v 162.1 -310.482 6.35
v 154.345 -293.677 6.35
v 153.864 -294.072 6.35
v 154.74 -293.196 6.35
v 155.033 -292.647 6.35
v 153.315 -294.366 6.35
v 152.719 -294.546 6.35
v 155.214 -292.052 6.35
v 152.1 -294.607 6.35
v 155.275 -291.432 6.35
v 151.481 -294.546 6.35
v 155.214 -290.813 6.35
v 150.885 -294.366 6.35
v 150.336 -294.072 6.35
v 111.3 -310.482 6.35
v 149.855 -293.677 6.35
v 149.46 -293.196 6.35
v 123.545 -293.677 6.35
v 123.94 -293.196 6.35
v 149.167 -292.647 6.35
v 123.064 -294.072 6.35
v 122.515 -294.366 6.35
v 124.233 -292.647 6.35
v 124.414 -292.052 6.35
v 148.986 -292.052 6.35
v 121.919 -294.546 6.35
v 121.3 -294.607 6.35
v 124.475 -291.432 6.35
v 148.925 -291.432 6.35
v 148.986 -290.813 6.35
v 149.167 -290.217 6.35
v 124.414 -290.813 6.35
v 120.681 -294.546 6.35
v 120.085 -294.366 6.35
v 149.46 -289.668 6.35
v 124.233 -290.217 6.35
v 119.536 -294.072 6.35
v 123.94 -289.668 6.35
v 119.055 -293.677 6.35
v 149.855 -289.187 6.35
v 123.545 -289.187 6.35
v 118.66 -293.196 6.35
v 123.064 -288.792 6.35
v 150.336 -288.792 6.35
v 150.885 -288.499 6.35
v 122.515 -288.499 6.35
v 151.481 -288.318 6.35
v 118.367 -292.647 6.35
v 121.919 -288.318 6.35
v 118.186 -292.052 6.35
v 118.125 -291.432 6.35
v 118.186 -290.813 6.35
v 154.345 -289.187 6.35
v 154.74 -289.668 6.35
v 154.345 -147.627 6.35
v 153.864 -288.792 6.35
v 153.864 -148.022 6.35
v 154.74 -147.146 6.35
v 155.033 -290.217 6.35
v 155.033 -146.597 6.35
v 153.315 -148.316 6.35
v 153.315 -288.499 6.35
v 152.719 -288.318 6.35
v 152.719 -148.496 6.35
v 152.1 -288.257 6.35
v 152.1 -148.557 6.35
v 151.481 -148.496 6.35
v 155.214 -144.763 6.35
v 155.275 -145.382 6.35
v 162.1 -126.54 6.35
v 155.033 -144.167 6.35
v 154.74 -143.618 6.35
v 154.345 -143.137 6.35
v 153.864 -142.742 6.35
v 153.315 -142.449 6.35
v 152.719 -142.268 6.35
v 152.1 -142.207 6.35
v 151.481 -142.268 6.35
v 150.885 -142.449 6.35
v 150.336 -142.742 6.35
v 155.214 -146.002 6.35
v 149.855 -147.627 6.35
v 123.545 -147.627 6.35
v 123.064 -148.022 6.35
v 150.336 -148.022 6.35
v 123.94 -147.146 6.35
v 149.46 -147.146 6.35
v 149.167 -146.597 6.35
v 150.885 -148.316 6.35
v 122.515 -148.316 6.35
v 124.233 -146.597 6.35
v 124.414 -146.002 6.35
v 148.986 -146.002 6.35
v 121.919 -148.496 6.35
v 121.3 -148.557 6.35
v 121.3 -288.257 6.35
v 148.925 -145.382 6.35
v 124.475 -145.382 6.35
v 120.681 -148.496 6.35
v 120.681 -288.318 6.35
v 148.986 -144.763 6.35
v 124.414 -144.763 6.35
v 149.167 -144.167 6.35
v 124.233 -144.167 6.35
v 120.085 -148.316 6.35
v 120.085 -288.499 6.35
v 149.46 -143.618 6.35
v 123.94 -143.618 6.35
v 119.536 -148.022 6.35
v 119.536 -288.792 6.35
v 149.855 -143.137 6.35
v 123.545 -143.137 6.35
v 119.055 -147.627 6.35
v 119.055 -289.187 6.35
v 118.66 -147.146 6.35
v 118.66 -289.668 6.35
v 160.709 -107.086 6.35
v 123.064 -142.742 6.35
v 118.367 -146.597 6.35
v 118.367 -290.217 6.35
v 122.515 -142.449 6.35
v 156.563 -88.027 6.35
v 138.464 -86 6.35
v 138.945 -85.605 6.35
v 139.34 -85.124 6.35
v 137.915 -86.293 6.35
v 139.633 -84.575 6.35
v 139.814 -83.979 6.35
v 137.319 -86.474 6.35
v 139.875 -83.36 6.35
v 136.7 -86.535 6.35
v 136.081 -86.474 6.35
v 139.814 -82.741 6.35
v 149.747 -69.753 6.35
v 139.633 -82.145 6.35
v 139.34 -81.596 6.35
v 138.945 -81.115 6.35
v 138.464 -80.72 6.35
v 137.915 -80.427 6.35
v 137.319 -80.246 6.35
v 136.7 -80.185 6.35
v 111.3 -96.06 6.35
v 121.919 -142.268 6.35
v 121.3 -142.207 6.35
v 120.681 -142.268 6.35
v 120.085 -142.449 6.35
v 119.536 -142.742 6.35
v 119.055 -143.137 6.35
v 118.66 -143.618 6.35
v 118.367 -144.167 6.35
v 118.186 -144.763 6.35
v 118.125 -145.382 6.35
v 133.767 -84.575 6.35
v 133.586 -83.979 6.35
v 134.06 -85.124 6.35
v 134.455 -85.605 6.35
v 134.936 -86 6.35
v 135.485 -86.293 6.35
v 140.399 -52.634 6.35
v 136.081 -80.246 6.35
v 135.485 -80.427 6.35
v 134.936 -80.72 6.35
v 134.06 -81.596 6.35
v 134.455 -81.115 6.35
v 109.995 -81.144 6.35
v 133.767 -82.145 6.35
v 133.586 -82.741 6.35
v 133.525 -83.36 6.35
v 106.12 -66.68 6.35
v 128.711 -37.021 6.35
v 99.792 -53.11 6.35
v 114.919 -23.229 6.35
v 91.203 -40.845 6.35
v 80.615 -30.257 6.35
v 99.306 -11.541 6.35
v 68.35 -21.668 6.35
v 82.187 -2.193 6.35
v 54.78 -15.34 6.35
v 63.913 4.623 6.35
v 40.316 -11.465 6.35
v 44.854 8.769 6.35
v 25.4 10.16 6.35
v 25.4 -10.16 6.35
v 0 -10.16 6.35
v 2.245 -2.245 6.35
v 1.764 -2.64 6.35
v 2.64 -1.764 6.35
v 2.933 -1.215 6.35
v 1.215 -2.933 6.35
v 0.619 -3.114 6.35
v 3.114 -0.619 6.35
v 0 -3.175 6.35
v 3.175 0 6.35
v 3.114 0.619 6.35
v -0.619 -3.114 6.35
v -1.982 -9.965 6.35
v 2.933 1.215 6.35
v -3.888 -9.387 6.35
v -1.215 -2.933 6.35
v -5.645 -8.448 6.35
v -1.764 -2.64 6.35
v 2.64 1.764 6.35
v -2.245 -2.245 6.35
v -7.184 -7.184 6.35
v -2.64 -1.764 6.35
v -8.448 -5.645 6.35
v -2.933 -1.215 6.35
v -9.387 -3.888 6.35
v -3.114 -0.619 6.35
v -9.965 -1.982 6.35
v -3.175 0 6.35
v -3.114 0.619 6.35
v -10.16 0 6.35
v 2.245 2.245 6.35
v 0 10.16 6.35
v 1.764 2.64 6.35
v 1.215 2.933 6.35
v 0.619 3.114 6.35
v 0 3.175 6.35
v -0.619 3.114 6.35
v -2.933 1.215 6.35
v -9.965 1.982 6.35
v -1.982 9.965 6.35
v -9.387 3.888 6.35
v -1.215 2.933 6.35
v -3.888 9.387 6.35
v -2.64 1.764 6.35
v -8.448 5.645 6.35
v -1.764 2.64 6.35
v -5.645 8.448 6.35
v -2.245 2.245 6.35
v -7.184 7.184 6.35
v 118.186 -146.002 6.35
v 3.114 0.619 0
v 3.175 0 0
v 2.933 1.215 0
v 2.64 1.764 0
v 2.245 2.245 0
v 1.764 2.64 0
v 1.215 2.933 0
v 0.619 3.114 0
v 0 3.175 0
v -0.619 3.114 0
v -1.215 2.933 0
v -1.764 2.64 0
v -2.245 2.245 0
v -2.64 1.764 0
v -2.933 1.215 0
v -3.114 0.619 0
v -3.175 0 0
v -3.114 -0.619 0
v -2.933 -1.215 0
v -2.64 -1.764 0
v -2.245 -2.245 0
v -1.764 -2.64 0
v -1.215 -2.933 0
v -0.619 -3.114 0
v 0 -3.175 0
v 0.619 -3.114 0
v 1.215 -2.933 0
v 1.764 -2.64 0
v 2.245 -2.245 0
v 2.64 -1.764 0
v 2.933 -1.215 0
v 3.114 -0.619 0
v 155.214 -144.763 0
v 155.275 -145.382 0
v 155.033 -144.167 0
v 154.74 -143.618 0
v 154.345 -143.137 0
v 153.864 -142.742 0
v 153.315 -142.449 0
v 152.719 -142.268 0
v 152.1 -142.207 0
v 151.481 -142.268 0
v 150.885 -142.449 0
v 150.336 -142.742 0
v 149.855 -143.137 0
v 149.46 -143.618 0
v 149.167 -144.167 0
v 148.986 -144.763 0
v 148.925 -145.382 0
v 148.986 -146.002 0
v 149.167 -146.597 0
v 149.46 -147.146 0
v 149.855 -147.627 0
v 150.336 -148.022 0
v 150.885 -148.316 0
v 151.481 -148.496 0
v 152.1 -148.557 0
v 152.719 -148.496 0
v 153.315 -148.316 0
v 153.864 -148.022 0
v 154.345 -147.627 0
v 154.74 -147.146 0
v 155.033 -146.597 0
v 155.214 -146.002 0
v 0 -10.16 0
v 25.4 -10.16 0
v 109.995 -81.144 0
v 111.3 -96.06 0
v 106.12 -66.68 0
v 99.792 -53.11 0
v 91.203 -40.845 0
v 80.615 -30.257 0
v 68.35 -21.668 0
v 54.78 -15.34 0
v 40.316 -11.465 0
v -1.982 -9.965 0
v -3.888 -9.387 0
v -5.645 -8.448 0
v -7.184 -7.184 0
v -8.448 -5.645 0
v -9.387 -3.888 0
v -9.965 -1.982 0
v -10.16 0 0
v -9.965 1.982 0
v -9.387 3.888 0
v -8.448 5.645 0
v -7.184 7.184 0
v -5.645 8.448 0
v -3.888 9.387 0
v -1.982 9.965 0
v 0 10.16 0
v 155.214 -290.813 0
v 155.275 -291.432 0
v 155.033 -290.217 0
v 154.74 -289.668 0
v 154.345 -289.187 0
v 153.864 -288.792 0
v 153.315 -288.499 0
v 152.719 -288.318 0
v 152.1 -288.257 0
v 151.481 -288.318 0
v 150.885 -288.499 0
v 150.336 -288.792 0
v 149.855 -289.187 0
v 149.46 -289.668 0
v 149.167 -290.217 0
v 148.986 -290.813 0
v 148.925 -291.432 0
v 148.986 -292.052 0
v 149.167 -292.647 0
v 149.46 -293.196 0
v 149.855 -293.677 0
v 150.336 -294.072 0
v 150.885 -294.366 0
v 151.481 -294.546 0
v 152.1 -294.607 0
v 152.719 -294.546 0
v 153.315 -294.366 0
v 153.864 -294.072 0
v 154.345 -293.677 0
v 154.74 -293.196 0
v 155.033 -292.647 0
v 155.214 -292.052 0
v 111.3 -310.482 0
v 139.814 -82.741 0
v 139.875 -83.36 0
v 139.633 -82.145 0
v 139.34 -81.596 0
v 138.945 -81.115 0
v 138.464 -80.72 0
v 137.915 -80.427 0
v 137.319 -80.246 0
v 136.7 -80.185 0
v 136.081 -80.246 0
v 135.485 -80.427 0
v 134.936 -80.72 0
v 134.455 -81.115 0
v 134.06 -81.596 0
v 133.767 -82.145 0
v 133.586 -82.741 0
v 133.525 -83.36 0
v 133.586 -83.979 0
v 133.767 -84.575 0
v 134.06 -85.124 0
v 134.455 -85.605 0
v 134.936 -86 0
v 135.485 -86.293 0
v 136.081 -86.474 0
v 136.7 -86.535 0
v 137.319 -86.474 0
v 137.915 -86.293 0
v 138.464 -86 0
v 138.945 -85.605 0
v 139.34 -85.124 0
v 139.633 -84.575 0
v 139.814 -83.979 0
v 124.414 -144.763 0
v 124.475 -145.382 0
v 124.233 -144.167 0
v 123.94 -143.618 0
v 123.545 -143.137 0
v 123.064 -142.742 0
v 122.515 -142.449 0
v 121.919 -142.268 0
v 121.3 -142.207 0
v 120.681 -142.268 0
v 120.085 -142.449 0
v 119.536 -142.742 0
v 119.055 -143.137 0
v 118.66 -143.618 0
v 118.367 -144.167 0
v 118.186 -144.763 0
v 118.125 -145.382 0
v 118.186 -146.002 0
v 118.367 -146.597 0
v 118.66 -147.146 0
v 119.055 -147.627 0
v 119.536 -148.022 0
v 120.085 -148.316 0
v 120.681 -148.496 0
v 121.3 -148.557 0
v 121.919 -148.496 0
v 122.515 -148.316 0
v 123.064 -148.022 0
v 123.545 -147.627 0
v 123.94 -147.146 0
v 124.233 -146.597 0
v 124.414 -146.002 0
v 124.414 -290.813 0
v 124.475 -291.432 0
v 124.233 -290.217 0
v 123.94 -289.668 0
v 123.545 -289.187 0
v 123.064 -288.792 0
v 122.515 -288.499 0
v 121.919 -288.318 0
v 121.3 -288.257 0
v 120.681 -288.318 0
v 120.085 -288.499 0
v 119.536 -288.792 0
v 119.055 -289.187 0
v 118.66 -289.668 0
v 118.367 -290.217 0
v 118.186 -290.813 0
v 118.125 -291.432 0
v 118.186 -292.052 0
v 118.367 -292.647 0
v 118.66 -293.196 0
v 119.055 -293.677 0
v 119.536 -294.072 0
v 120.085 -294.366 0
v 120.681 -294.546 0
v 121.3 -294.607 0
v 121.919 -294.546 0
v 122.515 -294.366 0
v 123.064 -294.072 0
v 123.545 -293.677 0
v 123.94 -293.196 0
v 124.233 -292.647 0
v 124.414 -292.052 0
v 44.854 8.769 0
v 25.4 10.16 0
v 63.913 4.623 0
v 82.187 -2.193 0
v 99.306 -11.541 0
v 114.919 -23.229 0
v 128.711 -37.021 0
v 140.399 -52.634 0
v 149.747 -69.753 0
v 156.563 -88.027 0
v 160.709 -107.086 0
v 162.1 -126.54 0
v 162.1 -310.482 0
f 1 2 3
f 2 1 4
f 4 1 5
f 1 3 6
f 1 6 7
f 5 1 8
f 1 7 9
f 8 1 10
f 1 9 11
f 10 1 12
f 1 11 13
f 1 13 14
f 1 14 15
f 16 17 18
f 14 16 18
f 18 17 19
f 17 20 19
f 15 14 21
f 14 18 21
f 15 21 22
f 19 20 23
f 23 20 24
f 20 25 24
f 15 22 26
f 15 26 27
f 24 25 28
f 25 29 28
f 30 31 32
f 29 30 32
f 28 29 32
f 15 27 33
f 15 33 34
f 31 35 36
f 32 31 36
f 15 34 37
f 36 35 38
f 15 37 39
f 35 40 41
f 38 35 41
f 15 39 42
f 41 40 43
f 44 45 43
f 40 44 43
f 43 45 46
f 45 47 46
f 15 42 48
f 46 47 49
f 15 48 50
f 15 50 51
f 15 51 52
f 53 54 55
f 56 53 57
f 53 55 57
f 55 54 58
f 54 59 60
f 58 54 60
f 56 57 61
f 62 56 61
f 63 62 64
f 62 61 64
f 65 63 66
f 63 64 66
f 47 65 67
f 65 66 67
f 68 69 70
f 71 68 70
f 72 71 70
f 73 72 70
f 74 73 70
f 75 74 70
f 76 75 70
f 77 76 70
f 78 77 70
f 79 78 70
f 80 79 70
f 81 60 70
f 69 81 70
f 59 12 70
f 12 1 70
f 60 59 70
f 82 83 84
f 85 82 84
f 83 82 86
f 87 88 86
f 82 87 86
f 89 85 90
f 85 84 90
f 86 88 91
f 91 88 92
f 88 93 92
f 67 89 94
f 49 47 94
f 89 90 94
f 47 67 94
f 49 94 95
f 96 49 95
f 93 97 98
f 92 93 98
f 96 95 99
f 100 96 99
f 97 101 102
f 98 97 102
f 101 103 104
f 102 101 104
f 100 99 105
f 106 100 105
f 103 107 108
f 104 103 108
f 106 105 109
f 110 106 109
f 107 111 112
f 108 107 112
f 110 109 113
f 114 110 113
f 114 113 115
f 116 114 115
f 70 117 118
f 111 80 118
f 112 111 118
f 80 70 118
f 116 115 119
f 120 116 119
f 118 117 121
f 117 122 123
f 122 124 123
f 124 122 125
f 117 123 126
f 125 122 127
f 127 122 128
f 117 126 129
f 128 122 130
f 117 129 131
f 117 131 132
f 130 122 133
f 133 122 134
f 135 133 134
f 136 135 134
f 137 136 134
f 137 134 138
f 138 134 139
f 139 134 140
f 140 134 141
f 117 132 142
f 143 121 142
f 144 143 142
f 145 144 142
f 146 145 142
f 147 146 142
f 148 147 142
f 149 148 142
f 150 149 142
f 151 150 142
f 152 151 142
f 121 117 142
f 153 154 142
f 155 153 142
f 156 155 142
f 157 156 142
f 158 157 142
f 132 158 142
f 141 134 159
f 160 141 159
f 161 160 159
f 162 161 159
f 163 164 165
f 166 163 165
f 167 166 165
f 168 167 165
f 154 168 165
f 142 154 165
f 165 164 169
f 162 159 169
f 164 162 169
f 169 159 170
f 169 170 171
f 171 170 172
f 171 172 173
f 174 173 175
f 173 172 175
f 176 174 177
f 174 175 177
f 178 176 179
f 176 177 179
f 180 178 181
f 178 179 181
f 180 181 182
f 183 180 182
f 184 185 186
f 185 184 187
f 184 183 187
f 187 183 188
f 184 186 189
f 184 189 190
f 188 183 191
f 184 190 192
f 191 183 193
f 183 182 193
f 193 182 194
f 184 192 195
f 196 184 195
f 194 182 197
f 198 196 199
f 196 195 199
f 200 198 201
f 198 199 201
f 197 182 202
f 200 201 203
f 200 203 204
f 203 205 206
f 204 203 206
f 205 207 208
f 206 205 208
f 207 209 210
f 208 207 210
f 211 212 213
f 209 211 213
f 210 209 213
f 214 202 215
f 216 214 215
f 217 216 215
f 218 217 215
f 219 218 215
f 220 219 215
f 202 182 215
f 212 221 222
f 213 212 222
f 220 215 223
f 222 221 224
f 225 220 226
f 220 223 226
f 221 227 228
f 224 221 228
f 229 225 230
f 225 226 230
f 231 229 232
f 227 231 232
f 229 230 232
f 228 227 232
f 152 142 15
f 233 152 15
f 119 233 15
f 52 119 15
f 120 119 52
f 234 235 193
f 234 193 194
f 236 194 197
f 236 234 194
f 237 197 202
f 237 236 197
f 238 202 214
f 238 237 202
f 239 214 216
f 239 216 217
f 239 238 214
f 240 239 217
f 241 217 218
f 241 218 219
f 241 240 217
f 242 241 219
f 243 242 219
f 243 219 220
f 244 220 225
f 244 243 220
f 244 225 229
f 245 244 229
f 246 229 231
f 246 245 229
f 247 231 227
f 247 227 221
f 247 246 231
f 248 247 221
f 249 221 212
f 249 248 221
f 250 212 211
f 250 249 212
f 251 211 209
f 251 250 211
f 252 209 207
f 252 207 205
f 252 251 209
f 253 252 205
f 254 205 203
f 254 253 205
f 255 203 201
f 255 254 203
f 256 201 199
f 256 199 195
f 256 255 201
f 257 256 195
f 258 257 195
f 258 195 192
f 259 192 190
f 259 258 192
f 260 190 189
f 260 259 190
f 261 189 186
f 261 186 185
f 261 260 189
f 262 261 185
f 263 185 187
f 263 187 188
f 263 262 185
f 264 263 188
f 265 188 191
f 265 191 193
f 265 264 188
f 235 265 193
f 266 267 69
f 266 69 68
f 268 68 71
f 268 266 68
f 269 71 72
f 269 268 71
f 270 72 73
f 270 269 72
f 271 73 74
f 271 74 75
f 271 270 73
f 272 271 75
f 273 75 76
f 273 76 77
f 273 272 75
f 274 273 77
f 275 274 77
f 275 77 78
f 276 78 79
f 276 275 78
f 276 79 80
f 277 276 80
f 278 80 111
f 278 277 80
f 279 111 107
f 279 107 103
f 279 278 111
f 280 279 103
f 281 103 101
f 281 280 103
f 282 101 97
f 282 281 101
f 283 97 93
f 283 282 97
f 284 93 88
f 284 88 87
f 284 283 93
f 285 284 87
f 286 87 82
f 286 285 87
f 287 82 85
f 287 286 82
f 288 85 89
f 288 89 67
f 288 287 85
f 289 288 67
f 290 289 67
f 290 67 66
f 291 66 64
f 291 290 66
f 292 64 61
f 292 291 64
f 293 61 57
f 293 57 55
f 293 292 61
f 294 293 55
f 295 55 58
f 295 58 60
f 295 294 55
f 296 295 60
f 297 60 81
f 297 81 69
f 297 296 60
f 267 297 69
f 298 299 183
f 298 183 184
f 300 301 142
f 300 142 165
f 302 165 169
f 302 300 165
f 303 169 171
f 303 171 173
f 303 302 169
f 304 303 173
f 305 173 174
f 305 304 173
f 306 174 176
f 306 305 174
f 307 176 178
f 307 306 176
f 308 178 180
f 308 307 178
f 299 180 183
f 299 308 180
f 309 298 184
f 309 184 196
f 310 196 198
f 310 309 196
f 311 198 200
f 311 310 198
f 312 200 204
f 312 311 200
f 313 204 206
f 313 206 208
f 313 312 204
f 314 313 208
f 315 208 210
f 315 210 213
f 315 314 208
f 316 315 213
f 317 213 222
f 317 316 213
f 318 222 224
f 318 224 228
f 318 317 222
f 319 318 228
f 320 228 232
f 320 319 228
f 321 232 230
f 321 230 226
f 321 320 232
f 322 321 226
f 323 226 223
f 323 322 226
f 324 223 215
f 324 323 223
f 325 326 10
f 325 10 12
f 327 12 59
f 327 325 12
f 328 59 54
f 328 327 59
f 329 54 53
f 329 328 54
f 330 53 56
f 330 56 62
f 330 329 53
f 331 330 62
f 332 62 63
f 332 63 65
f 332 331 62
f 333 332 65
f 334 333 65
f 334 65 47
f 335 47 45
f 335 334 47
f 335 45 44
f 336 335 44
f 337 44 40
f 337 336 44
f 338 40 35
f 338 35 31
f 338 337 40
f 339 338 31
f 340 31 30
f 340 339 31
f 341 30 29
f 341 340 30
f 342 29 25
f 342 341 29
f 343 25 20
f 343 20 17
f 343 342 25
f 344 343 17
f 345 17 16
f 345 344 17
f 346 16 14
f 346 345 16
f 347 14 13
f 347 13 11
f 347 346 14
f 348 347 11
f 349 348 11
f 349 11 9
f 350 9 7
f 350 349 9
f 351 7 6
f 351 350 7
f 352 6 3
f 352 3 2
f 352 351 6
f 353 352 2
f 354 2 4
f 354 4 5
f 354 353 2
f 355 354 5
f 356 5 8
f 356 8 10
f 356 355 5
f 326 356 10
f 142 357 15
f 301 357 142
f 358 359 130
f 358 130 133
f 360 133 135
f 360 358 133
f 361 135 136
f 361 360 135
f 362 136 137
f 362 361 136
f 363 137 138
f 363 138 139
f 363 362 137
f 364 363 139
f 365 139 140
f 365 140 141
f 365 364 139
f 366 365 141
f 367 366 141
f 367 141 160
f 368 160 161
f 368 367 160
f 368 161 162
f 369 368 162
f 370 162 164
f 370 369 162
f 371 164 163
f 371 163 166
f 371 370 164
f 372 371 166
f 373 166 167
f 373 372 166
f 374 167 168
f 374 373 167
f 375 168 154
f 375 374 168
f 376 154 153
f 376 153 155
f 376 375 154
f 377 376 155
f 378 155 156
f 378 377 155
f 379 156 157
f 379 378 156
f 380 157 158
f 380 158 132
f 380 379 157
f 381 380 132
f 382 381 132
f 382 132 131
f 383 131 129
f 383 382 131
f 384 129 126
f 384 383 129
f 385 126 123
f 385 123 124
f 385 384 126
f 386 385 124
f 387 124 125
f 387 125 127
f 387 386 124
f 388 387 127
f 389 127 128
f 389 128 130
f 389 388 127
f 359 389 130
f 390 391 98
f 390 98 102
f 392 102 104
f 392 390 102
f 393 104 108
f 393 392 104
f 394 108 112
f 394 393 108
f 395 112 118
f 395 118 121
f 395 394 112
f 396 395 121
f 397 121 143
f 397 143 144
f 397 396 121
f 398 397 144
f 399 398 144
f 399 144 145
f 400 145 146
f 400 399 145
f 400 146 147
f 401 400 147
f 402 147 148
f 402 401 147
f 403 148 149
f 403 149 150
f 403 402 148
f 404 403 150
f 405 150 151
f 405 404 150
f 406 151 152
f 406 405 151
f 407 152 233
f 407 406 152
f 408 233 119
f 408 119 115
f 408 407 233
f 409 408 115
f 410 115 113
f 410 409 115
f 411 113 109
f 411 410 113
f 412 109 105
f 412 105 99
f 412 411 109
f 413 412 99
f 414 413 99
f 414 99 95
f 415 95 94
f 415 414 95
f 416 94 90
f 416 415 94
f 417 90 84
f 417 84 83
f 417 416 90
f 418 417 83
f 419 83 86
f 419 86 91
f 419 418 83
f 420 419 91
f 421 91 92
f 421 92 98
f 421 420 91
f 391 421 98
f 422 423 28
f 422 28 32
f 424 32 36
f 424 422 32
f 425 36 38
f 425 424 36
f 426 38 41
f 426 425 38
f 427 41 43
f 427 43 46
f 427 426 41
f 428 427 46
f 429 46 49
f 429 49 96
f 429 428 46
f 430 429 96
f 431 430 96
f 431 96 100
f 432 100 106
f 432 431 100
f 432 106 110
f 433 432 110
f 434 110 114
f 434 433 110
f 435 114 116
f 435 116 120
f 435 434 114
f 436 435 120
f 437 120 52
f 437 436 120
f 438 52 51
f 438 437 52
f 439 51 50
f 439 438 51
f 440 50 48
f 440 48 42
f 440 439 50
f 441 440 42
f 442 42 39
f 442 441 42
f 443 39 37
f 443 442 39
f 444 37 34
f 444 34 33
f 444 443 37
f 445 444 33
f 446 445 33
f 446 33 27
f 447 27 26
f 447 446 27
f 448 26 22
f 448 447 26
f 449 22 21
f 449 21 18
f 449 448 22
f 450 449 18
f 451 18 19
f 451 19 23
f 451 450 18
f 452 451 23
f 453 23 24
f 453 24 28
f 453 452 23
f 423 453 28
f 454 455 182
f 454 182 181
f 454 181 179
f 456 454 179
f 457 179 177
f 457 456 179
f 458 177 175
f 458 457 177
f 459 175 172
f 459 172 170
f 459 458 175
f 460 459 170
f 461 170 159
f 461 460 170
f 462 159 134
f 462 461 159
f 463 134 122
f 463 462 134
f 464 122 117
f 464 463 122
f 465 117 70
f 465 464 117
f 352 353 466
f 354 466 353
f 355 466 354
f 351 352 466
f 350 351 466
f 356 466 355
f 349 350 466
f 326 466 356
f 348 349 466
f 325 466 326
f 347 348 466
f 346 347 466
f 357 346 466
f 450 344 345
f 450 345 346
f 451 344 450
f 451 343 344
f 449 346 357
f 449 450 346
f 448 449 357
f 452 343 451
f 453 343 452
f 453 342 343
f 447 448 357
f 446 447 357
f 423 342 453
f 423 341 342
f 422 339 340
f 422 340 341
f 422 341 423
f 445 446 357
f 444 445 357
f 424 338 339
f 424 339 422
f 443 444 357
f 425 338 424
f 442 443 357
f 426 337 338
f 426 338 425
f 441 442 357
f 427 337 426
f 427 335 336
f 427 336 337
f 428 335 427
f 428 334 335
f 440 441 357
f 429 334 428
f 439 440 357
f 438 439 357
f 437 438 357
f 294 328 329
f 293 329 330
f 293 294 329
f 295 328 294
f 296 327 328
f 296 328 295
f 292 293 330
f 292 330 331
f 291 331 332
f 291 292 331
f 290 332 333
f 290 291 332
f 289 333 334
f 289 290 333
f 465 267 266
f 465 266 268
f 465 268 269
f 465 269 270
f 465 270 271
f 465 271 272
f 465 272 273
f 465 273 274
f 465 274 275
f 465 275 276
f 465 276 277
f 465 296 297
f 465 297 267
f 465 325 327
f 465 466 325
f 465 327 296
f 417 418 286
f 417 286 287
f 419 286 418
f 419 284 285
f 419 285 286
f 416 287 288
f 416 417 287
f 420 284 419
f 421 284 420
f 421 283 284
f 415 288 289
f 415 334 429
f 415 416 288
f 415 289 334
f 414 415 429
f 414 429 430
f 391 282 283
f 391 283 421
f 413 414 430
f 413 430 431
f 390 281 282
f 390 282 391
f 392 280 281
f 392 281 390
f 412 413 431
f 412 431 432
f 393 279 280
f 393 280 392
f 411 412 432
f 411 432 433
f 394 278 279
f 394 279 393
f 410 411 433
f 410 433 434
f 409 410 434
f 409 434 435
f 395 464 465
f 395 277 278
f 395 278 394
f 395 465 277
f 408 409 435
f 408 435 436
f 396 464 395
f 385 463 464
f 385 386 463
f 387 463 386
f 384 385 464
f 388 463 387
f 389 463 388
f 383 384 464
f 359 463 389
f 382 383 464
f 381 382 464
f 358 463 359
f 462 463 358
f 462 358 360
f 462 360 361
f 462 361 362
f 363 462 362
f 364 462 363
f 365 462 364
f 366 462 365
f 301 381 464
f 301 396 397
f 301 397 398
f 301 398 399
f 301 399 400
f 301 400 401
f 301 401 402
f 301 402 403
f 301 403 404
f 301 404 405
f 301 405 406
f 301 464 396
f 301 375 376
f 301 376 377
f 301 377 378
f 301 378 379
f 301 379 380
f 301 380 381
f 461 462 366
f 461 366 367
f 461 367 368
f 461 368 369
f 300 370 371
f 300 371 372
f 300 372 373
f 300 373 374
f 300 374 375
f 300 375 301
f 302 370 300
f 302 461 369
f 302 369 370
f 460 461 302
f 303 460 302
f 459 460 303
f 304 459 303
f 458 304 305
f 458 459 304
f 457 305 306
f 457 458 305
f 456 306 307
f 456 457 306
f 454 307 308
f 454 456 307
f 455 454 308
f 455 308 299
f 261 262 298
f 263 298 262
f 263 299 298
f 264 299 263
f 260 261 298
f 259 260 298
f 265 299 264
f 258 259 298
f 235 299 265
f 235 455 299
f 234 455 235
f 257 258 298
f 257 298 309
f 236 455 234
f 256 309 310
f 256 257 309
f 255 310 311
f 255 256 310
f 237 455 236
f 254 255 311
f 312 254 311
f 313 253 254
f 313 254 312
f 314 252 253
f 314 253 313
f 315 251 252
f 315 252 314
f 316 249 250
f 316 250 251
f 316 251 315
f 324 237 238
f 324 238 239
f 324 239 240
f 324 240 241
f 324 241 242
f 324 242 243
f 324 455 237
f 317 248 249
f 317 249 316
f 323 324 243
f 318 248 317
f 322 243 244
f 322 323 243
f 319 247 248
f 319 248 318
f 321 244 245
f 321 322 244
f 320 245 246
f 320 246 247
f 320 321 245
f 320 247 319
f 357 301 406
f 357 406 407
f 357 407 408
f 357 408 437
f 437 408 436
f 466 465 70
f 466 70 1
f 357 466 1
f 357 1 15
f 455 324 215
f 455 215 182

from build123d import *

# Parameters (mm, degrees)
SKETCH1_R           = 3.175
BOSS_EXTRUDE1_DEPTH = 6.35


with BuildPart() as part:
    # Sketch1 → Boss-Extrude1 (new body)
    with BuildSketch(Plane.XY):
        with BuildLine():
            Line((0, 10.16), (25.4, 10.16))
            ThreePointArc((25.4, 10.16), (122.061496988, -29.878503012), (162.1, -126.54))
            Line((162.1, -126.54), (162.1, -310.482187261))
            Line((162.1, -310.482187261), (111.3, -310.482187261))
            Line((111.3, -310.482187261), (111.3, -96.06))
            ThreePointArc((111.3, -96.06), (86.140472504, -35.319527496), (25.4, -10.16))
            Line((25.4, -10.16), (0, -10.16))
            ThreePointArc((0, -10.16), (-10.16, 0), (0, 10.16))
        make_face()
        Circle(SKETCH1_R, mode=Mode.SUBTRACT)
        with Locations((136.7, -83.36)):
            Circle(SKETCH1_R, mode=Mode.SUBTRACT)
        with Locations((121.3, -291.432187261)):
            Circle(SKETCH1_R, mode=Mode.SUBTRACT)
        with Locations((152.1, -291.432187261)):
            Circle(SKETCH1_R, mode=Mode.SUBTRACT)
        with Locations((121.3, -145.382187261)):
            Circle(SKETCH1_R, mode=Mode.SUBTRACT)
        with Locations((152.1, -145.382187261)):
            Circle(SKETCH1_R, mode=Mode.SUBTRACT)
    extrude(amount=BOSS_EXTRUDE1_DEPTH)


solid = part.part
